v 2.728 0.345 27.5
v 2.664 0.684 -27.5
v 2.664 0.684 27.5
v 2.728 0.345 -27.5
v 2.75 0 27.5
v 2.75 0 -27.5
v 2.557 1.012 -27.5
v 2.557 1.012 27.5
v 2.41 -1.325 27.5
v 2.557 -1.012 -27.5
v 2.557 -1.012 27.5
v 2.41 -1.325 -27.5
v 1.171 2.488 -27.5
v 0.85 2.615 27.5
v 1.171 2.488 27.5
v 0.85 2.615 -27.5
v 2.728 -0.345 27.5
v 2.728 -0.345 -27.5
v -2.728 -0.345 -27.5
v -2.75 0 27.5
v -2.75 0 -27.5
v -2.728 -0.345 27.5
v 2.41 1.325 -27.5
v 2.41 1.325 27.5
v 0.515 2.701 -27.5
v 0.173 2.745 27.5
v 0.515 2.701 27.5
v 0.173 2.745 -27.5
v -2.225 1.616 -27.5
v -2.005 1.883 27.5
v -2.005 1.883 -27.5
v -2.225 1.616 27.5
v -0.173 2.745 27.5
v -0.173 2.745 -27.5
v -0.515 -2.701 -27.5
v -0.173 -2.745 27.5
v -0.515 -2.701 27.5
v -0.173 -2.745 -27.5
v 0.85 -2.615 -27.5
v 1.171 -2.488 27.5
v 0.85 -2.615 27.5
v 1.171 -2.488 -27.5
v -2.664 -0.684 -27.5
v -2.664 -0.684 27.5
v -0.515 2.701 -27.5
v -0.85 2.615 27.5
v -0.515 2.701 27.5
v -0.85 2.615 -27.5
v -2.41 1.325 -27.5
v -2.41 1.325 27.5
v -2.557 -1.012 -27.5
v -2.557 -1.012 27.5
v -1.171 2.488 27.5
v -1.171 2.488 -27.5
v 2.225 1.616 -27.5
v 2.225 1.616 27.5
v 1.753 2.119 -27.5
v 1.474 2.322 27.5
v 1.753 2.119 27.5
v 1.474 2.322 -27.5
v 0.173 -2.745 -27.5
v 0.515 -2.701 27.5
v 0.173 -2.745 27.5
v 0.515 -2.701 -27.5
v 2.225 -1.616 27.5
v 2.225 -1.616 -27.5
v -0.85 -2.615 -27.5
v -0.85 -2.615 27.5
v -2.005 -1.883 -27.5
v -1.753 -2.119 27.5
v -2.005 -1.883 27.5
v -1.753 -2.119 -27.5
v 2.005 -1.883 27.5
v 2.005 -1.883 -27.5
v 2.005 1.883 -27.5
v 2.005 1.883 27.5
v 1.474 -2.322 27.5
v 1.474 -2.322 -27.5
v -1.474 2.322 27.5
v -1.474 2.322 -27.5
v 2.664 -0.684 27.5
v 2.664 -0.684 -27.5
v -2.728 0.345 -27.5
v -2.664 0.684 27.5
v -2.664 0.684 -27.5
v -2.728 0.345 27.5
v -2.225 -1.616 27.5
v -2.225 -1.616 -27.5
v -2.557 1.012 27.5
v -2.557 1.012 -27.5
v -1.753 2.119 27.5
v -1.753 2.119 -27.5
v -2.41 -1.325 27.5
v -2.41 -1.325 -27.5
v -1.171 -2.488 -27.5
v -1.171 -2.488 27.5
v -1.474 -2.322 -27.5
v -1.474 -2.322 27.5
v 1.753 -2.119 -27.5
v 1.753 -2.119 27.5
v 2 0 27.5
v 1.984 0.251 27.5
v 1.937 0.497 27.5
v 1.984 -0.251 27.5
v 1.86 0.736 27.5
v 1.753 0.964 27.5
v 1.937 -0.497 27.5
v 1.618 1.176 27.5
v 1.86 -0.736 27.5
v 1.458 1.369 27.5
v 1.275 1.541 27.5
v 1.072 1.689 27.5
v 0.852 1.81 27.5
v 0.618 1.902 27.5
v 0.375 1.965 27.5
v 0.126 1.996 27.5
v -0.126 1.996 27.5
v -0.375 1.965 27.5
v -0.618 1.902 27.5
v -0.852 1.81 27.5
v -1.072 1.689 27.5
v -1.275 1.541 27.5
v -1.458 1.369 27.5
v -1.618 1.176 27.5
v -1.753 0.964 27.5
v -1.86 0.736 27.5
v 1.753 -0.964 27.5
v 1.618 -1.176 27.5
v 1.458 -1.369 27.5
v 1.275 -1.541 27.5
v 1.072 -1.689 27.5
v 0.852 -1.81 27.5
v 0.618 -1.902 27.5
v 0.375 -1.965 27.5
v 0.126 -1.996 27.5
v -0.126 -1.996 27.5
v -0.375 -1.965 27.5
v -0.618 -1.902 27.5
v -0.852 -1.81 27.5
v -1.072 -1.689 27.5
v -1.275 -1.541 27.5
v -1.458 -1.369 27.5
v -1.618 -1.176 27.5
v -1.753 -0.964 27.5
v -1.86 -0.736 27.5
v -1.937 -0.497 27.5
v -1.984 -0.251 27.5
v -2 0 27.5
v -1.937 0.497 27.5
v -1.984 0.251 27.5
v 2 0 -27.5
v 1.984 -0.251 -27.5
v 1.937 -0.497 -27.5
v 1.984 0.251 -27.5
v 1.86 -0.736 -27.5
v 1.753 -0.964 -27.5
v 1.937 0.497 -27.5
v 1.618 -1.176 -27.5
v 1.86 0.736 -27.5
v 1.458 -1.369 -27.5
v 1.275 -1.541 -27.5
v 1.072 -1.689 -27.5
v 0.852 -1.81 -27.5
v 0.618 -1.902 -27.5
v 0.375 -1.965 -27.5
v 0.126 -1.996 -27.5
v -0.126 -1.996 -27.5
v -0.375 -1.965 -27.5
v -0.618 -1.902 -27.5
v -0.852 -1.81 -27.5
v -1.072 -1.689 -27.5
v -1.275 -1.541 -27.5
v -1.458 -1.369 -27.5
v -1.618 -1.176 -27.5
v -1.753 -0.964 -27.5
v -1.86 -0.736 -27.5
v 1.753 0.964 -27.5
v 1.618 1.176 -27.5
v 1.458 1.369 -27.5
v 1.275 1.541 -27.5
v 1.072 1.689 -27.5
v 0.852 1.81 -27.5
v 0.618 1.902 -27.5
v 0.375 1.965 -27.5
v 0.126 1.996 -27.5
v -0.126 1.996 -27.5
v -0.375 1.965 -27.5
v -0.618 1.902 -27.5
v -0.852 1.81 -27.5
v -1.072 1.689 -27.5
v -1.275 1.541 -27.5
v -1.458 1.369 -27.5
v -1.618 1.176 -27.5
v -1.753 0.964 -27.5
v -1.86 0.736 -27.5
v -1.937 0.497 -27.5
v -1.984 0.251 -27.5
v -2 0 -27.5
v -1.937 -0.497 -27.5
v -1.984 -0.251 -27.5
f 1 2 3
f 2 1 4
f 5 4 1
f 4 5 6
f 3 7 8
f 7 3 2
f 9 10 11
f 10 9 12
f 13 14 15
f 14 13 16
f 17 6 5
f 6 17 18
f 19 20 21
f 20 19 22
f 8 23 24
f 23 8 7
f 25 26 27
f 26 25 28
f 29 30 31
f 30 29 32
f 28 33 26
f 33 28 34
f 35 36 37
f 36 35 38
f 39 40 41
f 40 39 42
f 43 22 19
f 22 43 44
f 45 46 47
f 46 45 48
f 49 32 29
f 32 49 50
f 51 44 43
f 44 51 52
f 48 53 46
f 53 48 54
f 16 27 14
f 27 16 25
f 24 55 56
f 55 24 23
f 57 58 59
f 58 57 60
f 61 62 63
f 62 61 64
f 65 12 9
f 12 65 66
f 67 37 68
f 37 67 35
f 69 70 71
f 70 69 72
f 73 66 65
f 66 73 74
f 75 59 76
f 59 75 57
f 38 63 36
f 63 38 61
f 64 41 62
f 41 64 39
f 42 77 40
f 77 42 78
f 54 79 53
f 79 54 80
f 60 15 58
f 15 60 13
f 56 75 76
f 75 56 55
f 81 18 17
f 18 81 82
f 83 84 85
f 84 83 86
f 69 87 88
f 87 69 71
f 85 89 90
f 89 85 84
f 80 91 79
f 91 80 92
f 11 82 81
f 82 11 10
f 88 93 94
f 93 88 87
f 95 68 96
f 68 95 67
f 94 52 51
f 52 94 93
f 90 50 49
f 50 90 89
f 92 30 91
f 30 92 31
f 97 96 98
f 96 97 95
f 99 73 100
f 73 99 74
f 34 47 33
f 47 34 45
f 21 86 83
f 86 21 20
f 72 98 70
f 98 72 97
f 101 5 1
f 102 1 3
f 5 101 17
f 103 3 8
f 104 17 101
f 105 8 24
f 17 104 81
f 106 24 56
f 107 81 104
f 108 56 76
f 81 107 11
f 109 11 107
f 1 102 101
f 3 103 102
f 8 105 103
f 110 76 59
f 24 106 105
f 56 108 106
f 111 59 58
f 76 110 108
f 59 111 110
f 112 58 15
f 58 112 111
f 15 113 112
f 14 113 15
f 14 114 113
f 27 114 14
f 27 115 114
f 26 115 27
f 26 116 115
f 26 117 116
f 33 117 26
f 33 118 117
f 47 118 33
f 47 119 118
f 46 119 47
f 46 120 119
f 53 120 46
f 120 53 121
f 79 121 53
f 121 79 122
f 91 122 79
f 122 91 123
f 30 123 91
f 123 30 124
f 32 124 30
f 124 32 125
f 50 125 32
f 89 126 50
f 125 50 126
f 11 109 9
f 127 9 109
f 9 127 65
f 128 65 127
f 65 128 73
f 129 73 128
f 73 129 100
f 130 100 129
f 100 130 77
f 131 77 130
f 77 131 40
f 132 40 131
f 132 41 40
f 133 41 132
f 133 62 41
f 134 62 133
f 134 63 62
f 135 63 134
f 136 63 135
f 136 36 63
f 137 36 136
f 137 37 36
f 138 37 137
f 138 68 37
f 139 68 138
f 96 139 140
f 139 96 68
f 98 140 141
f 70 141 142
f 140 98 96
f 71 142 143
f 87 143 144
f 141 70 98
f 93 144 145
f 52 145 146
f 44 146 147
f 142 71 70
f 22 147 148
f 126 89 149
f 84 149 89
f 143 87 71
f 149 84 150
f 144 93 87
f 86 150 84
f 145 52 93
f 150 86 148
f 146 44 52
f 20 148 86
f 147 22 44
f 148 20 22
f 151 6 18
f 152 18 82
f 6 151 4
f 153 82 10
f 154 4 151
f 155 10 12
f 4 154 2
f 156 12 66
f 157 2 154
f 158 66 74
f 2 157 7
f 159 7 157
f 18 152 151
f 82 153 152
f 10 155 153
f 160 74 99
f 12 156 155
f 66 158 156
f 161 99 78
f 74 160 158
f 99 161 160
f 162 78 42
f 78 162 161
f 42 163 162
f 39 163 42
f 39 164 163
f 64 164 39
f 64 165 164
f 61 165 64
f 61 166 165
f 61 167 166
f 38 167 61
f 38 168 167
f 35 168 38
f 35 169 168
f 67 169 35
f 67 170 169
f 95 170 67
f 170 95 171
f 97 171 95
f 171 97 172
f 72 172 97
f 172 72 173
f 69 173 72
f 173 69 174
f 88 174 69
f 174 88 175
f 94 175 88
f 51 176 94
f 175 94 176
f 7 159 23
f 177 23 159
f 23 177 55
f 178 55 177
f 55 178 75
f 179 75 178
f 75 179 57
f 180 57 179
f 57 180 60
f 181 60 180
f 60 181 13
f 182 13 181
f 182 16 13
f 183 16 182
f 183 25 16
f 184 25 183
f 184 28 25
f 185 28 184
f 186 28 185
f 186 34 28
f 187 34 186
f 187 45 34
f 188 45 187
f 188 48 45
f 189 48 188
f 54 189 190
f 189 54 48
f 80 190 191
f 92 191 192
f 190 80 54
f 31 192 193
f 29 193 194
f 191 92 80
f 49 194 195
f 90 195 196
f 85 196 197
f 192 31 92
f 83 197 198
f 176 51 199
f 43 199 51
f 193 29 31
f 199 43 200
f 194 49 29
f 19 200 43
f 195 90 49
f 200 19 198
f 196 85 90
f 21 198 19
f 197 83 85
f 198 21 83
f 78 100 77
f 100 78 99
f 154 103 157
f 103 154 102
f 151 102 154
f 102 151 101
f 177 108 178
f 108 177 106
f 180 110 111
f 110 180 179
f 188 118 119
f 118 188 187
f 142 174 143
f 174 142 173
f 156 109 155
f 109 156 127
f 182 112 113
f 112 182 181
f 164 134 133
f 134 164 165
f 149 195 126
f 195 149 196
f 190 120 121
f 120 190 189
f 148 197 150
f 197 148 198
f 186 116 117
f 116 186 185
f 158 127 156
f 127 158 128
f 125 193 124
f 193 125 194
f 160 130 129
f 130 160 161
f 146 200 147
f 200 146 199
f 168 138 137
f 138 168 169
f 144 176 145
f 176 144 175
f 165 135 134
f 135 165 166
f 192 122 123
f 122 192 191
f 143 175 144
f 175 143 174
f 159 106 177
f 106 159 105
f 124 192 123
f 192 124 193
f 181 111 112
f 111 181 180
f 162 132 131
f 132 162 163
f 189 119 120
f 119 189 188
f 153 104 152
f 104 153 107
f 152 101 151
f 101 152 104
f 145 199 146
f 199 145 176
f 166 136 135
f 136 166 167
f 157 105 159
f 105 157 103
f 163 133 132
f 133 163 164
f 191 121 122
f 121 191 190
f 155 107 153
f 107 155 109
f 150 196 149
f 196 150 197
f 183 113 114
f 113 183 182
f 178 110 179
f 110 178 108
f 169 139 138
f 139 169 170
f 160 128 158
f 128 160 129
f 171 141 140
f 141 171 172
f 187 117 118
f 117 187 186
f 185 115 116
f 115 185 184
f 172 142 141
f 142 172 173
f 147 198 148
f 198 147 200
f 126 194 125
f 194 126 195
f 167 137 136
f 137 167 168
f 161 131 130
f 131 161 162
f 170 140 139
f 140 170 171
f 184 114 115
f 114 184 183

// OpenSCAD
$fn = 50;


difference() {
	union() {
		translate(v = [0, 0, -27.5000000000]) {
			cylinder(h = 55, r = 2.7500000000);
		}
	}
	union() {
		translate(v = [0, 0, -100.0000000000]) {
			cylinder(h = 200, r = 2.0000000000);
		}
	}
}
